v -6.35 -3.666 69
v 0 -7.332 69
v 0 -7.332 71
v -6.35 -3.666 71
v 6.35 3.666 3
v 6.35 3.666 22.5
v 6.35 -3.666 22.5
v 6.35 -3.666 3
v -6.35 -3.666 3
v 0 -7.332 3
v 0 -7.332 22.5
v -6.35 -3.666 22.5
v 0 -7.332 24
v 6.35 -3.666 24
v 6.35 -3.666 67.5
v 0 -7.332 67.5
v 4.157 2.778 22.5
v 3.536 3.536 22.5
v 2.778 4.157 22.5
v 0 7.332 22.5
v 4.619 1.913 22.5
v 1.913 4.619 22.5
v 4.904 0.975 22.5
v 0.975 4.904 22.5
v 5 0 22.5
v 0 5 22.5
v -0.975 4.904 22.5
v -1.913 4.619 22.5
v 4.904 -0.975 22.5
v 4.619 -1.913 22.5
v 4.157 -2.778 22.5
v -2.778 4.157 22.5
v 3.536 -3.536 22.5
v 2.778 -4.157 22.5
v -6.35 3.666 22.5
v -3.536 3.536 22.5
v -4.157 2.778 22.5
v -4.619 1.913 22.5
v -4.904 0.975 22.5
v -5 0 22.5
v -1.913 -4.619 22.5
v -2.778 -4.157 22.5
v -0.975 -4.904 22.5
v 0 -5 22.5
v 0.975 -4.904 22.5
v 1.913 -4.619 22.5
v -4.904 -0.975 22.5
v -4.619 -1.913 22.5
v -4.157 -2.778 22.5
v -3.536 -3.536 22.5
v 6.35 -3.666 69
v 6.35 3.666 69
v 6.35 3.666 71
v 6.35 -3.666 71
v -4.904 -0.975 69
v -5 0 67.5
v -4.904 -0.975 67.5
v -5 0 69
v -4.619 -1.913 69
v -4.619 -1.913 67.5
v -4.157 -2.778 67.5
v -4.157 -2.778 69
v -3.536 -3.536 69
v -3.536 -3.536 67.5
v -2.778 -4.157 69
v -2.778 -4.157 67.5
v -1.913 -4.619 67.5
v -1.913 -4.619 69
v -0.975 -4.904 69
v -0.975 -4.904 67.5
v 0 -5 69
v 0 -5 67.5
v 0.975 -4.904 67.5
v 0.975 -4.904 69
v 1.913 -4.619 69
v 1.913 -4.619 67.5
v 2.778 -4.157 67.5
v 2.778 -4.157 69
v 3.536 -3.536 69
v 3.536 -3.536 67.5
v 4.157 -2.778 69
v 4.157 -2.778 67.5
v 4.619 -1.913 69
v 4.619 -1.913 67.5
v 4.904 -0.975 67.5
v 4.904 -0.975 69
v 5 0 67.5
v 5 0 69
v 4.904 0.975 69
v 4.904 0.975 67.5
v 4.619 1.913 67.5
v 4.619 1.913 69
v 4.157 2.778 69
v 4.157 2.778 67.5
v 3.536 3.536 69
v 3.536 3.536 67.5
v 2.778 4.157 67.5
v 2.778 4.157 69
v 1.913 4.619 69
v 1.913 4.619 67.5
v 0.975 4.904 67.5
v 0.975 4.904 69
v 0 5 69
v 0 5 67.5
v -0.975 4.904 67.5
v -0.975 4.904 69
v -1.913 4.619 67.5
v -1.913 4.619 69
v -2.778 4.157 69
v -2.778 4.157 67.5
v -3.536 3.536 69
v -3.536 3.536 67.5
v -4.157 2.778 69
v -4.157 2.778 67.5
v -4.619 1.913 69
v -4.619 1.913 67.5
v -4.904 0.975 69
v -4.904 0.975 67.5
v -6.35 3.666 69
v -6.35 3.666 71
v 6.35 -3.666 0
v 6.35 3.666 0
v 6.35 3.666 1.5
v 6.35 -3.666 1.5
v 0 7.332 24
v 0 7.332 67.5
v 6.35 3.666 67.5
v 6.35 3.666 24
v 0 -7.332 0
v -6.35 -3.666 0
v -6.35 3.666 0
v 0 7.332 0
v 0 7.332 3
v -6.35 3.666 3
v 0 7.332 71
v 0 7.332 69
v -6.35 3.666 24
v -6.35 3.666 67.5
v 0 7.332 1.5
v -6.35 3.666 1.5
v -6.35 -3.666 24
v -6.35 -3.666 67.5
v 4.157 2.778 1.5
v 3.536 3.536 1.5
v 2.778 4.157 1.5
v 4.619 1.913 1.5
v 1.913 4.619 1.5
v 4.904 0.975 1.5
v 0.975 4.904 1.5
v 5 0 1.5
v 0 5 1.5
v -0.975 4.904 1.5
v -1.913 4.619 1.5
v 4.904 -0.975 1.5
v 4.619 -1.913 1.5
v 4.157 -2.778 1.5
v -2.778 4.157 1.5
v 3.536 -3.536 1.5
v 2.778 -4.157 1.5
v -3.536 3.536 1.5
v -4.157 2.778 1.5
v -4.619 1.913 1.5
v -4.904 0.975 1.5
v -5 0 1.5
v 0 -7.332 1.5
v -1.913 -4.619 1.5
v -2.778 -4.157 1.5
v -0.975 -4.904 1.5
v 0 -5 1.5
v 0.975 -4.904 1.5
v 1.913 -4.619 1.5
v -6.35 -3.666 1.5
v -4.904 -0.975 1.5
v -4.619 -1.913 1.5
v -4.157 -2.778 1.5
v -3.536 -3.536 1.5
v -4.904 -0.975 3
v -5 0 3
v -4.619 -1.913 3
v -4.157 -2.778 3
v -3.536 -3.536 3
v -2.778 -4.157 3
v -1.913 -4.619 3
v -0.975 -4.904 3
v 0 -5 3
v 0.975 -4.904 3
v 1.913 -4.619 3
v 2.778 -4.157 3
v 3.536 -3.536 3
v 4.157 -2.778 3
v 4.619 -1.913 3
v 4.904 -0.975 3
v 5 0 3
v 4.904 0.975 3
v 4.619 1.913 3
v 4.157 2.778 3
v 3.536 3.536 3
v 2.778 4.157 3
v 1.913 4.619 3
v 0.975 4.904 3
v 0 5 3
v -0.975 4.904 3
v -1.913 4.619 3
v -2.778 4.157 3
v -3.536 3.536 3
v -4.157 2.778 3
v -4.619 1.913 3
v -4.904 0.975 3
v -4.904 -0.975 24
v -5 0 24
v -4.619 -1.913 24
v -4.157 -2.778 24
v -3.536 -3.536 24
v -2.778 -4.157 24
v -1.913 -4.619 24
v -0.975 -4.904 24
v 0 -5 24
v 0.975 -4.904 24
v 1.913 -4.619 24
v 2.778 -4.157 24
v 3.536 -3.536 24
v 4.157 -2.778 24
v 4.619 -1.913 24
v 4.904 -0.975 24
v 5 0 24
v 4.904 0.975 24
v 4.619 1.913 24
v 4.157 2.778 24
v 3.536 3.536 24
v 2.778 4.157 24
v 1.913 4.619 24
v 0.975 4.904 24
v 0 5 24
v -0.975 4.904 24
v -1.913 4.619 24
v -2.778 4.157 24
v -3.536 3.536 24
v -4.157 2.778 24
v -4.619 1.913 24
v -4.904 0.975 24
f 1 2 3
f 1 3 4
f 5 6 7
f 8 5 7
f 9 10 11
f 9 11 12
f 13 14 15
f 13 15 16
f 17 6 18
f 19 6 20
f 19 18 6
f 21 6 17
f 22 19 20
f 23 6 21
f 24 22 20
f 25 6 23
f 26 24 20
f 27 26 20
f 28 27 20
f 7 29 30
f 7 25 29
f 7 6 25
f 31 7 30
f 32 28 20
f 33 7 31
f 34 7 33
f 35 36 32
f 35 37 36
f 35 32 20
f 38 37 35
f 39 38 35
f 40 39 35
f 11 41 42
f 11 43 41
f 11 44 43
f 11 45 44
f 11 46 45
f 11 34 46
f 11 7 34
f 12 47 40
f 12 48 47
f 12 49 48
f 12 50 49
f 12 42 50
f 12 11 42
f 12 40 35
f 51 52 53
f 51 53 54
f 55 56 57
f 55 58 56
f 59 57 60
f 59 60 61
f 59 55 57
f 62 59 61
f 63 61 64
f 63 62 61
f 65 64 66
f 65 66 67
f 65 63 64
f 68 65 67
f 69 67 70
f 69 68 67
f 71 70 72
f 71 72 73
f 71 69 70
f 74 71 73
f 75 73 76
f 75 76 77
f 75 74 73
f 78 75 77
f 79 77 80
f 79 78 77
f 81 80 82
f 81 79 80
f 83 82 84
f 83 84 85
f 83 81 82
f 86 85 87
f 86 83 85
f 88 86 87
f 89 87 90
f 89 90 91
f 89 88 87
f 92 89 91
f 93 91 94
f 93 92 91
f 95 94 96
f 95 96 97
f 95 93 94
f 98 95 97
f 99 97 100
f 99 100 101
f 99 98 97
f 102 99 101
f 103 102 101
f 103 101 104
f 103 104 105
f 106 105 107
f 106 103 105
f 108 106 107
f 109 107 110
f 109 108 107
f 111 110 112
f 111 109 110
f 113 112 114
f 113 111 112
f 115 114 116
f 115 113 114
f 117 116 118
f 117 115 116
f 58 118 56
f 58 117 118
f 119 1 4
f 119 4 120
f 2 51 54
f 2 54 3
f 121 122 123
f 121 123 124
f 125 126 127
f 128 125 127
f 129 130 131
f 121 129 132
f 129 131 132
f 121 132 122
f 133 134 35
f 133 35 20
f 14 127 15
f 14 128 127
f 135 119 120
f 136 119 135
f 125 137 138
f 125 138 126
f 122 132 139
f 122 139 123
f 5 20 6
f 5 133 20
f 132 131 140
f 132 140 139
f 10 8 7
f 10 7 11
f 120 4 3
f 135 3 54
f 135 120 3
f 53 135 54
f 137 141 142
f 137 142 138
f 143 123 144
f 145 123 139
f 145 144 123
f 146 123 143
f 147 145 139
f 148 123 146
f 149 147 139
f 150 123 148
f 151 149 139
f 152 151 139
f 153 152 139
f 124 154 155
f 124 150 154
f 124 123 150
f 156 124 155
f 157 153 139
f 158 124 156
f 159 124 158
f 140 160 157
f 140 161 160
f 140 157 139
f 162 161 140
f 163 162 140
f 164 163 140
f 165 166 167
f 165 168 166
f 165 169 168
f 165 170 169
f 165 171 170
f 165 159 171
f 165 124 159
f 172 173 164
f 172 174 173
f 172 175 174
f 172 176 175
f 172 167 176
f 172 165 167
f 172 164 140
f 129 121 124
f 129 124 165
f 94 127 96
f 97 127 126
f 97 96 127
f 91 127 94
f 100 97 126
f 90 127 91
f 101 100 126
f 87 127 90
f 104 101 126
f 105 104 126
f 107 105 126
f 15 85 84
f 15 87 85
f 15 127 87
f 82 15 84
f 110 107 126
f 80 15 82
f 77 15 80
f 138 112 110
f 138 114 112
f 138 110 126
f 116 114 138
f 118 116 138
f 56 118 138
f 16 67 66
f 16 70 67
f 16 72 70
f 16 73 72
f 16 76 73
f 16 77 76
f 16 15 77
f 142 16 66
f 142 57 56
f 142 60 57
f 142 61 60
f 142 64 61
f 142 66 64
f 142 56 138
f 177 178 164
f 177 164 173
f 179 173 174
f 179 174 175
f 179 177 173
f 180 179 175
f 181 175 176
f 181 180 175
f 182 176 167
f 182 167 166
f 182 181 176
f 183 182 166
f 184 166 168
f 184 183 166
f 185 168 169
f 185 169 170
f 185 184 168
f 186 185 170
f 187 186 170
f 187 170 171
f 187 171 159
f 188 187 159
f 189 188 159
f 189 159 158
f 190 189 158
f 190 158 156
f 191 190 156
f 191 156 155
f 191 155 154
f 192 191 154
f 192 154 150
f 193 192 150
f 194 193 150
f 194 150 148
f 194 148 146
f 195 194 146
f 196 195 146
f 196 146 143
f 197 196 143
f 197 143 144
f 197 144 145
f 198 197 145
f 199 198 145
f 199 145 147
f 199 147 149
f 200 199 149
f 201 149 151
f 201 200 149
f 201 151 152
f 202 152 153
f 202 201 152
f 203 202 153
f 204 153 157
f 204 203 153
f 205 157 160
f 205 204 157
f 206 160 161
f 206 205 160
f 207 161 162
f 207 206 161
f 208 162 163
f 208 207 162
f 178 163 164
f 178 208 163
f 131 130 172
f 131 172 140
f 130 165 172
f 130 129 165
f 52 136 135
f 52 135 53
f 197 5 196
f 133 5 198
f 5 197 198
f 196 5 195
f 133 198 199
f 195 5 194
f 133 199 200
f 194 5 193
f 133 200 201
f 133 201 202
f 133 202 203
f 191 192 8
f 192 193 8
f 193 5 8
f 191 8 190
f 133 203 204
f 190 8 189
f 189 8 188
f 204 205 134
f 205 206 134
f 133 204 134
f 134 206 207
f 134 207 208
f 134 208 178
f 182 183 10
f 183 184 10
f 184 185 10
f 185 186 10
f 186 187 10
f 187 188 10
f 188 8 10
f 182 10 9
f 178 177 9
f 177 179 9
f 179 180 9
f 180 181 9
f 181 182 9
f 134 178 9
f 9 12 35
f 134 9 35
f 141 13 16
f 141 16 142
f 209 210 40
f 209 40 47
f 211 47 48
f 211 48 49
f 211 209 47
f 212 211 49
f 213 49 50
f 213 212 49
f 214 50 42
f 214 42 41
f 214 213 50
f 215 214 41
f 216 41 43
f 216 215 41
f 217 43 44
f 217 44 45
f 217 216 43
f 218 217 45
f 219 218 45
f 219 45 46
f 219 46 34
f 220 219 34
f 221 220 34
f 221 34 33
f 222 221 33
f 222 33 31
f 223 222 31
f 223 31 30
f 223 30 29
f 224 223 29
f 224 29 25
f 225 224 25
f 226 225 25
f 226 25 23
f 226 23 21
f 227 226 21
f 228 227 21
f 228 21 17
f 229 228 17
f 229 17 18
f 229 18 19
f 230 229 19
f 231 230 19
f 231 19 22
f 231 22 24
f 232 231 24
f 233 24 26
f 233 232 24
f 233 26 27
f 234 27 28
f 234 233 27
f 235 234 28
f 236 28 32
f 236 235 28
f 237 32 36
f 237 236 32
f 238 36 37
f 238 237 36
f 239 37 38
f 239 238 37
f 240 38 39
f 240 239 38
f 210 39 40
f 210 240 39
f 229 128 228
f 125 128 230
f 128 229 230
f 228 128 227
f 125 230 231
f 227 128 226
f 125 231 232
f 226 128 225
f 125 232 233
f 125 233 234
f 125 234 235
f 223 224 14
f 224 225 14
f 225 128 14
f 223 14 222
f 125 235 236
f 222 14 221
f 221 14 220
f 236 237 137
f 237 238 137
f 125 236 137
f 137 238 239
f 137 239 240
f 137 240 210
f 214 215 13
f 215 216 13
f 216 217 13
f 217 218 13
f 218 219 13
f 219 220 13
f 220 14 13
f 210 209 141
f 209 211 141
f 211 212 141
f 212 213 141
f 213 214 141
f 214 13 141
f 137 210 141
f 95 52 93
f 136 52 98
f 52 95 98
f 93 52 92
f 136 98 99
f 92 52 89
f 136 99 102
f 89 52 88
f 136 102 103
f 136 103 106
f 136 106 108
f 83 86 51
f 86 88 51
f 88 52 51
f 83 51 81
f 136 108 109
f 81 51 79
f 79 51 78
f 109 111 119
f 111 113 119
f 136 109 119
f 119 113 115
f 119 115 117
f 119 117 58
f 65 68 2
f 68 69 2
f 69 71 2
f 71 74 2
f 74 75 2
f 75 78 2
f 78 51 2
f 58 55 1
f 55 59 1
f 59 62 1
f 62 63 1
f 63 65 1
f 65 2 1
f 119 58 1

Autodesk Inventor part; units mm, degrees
ref_plane "YZ Plane" through (0, 0, 0) normal (1, 0, 0) x (0, 1, 0)
ref_plane "XZ Plane" through (0, 0, 0) normal (0, 1, 0) x (-1, 0, 0)
ref_plane "XY Plane" through (0, 0, 0) normal (0, 0, 1) x (1, 0, 0)
sketch "Sketch1" plane through (0, 0, 0) normal (0, 0, 1) x (1, 0, 0)
  line L0 (6.35, 3.6662) -> (6.35, -3.6662)
  line L1 (6.35, -3.6662) -> (0, -7.3323)
  line L2 (0, -7.3323) -> (-6.35, -3.6662)
  line L3 (-6.35, -3.6662) -> (-6.35, 3.6662)
  line L4 (-6.35, 3.6662) -> (0, 7.3323)
  line L5 (0, 7.3323) -> (6.35, 3.6662)
  point P0 (0, 0)
  point P1 (0, 0)
  dimension "d0" = 12.7
extrude "Extrusion1" add sketch "Sketch1" along normal blind 71
sketch "Sketch2" plane through (0, 0, 0) normal (0, 1, 0) x (-1, 0, 0)
  line L0 (15, 67.5) -> (5, 67.5)
  line L1 (5, 67.5) -> (5, 69)
  line L2 (5, 69) -> (15, 69)
  line L3 (15, 69) -> (15, 67.5)
  line L4 (15, 22.5) -> (5, 22.5)
  line L5 (5, 22.5) -> (5, 24)
  line L6 (5, 24) -> (15, 24)
  line L7 (15, 24) -> (15, 22.5)
  line L8 (15, 1.5) -> (5, 1.5)
  line L9 (5, 1.5) -> (5, 3)
  line L10 (5, 3) -> (15, 3)
  line L11 (15, 3) -> (15, 1.5)
  line L12 (0, 71) -> (6.35, 71) projected
  line L13 (0, 0) -> (0, 71) projected
  line L14 (0, -14) -> (0, 84) projected
  dimension "d3" = 2
  dimension "d4" = 1.5
  dimension "d5" = 47
  dimension "d6" = 68
  dimension "d7" = 10
  dimension "d8" = 5
revolve "Revolution1" cut sketch "Sketch2" angle 360 about axis through (0, 0, -10) along (0, 0, 1)
properties part number "Performance Axle"
